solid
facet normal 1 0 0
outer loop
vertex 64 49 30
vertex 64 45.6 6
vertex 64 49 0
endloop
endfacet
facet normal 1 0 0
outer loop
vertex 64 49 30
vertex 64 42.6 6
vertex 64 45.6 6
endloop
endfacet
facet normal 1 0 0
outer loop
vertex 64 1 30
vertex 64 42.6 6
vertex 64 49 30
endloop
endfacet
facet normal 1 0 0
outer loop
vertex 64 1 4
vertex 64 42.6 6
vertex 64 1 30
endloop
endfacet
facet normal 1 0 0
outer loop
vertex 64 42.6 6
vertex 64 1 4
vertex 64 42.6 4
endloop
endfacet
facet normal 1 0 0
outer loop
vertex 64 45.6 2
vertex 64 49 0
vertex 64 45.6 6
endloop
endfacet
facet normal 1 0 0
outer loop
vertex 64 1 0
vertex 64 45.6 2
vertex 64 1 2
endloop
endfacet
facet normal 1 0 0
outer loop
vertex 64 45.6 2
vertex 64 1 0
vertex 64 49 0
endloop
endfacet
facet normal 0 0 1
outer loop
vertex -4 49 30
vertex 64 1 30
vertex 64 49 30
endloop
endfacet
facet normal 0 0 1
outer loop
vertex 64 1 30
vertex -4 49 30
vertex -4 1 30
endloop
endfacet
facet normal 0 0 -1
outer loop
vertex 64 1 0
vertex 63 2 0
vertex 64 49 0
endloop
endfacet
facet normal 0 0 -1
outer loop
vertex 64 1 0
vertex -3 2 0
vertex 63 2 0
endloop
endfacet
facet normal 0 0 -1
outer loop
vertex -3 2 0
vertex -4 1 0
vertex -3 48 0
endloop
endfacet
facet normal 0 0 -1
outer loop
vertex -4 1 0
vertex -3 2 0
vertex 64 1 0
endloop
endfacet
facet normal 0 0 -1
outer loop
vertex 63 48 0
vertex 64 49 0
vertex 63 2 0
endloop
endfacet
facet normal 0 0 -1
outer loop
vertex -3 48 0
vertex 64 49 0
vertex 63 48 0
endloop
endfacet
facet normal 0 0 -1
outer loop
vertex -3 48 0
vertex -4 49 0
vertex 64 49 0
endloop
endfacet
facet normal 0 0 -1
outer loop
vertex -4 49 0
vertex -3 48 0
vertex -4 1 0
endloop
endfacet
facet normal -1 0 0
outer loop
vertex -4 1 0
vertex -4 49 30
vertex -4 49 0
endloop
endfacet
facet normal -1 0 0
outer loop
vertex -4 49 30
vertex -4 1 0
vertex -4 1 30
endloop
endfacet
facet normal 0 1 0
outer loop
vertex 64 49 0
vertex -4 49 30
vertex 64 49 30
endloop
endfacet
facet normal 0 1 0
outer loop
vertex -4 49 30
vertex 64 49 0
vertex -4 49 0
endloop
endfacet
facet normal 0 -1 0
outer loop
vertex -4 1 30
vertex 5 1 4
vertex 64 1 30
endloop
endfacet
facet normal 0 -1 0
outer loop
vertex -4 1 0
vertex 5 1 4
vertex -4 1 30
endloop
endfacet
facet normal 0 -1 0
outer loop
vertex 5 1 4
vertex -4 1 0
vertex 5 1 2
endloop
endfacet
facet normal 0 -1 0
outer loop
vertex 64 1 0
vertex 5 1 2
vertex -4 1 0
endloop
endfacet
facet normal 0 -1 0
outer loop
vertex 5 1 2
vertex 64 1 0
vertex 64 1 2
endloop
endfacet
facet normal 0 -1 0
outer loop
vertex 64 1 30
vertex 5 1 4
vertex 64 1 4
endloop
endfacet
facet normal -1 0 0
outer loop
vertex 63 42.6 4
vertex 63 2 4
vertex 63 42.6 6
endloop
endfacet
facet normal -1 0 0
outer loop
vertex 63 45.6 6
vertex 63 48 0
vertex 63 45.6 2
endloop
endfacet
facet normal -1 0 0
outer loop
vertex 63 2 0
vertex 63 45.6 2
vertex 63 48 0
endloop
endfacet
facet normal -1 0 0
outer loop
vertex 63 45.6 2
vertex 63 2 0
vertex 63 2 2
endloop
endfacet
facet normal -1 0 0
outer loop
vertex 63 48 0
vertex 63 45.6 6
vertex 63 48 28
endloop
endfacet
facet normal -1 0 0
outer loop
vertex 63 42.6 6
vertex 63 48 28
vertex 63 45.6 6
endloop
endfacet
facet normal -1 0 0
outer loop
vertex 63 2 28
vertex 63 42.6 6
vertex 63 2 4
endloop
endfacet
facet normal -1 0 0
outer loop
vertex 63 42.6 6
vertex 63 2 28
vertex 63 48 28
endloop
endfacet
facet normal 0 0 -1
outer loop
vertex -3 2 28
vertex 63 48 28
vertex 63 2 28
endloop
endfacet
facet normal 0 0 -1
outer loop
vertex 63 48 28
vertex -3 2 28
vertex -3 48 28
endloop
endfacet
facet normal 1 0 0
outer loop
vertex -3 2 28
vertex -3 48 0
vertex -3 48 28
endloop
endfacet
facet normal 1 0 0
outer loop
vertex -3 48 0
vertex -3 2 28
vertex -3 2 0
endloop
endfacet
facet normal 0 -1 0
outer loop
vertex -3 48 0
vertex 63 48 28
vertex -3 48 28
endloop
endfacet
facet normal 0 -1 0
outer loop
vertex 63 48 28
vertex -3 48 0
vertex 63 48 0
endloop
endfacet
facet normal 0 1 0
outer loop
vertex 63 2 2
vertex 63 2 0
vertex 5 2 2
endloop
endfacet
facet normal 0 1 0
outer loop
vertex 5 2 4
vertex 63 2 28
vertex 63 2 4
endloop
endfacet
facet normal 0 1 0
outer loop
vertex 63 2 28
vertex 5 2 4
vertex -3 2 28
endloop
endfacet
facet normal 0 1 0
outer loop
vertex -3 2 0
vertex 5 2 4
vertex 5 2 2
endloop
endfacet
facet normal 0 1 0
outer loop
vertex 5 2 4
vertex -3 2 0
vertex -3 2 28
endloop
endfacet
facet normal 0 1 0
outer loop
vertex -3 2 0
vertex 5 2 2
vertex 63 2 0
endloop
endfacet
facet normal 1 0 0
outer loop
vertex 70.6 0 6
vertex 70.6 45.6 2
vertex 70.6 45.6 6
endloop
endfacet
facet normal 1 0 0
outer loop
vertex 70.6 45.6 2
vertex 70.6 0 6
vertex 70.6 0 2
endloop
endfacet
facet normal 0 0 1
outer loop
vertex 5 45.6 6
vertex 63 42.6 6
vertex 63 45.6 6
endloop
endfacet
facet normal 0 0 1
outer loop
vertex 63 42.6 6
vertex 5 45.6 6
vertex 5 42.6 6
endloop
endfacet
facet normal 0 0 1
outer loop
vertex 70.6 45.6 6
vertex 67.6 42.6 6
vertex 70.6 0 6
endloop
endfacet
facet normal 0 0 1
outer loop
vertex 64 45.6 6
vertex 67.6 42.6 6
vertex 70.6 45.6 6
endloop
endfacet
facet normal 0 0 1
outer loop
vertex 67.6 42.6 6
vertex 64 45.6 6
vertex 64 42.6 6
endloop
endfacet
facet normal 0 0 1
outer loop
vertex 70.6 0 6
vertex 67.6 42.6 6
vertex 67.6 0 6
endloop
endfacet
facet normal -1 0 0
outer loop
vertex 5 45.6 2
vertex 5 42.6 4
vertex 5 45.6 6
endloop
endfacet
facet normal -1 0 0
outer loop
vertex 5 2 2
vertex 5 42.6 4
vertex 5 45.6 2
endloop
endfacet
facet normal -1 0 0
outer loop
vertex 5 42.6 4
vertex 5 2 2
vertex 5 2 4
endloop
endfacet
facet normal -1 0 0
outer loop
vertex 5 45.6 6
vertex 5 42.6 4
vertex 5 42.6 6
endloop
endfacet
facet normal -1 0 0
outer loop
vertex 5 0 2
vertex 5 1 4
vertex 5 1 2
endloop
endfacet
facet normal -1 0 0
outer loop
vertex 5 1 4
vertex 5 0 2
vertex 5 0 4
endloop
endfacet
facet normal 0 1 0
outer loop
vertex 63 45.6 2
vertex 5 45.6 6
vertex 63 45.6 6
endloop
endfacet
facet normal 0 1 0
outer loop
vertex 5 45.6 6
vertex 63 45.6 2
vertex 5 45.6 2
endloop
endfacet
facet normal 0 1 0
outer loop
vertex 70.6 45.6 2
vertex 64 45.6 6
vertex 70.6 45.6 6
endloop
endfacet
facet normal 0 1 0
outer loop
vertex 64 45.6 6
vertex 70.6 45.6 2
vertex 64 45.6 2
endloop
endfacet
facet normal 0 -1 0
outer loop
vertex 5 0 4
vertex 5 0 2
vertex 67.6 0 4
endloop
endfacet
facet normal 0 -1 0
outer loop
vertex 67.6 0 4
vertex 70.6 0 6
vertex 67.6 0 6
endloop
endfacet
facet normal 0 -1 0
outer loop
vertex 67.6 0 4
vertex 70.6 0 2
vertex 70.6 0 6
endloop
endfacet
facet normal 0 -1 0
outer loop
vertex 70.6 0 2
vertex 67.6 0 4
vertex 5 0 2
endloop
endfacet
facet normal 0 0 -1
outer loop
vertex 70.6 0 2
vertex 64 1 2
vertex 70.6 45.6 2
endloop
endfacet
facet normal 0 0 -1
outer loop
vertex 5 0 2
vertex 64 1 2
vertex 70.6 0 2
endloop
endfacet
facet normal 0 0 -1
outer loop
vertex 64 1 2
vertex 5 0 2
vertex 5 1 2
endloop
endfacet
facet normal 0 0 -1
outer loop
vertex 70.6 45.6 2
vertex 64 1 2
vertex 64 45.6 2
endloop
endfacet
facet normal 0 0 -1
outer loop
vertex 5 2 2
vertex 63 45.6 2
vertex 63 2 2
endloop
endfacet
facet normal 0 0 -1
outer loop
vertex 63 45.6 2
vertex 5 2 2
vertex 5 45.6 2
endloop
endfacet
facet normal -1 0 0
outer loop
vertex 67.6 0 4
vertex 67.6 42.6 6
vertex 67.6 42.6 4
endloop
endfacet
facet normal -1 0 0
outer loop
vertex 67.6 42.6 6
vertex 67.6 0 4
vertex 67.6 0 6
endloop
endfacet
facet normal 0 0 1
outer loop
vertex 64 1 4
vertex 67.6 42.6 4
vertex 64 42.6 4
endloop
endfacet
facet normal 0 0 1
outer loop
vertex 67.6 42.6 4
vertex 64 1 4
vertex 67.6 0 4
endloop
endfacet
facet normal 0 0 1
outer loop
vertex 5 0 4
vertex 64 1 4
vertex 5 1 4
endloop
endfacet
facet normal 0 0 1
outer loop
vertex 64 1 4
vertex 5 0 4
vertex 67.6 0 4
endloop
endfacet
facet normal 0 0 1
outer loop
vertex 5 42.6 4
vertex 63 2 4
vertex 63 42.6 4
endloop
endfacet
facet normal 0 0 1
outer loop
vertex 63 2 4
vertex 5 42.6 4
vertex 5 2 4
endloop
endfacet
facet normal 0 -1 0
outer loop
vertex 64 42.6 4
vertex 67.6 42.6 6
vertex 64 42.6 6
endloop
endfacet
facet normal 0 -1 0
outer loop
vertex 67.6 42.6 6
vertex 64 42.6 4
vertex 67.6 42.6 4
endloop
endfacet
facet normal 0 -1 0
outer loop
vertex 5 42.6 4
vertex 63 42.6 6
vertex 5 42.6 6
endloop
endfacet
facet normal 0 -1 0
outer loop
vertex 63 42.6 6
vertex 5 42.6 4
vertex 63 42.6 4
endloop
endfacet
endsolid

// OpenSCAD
// Two-part enclosure for electronics board.
// Part 1: Box (left). Part 2: Lid (right, printed upside down).
// Both parts sit on the XY plane (Z=0) with a 10 mm gap.

// --- Dimensions ---
// Box outer dimensions (X, Y, Z)
box_w = 70;
box_h = 50;
box_d = 30;

// Wall and floor thickness
wall_t = 2;
floor_t = 2;

// Lid dimensions
lid_plate_t = 2;
lip_t = 1.5;
lip_h = 4;
// Lip outer size
lip_w = 65.6;
lip_h_dim = 45.6;

// Clearance
clearance = 0.2;

// Gap between parts
gap = 10;

// --- Derived Dimensions ---
// Box inner dimensions
box_w_in = box_w - 2 * wall_t;
box_h_in = box_h - 2 * wall_t;
box_d_in = box_d - floor_t; // Open top, so only bottom floor thickness

// Lid lip inner dimensions (to match box inner)
lip_w_in = box_w_in + 2 * clearance;
lip_h_dim_in = box_h_in + 2 * clearance;

// Lid lip outer dimensions (given)
lip_w_out = lip_w;
lip_h_dim_out = lip_h_dim;

// --- Main Module ---
module enclosure() {
    // Part 1: The Box
    // Position: Centered in Y, starts at X = -gap/2
    translate([-gap / 2, 0, 0]) {
        difference() {
            // Outer block
            translate([wall_t / 2, wall_t / 2, 0]) 
                cube([box_w - wall_t, box_h - wall_t, box_d]);
            
            // Inner void (open top)
            translate([wall_t, wall_t, 0]) 
                cube([box_w_in, box_h_in, box_d_in]);
        }
    }

    // Part 2: The Lid
    // Printed upside down, so the plate is on Z=0 and the lip points down (-Z).
    // Position: Centered in Y, starts at X = gap/2
    translate([gap / 2, 0, 0]) {
        difference() {
            // Outer block (Plate + Lip)
            // Plate is 70x50x2. Lip is 65.6x45.6x(2+4).
            // We build the whole block as one big cube, then cut.
            translate([0, 0, 0]) 
                cube([lip_w_out, lip_h_dim_out, lip_h + lid_plate_t]);
            
            // Cut out the plate hole (the space under the lip)
            // The plate is 70x50. The lip sits on top of it.
            // We need to remove the volume where the plate is, except for the lip.
            
            // 1. Remove the plate volume (70x50x2)
            translate([0, 0, 0]) 
                cube([box_w, box_h, lid_plate_t]);
            
            // 2. Remove the lip hole (the space inside the lip)
            // The lip is centered.
            // Lip outer: 65.6 x 45.6. Lip inner: 65.6 x 45.6 (calculated above).
            // Wait, the lip outer is 65.6, inner is 65.6? No.
            // Lip outer is 65.6. Lip inner must be smaller to have walls.
            // Re-reading prompt: "lip ... whose outer size is 65.6 x 45.6 mm, centred on the plate, so it slides into the box opening with 0.2 mm clearance on each side."
            // Box inner is 66 x 46.
            // Lip outer is 65.6 x 45.6.
            // Clearance = (Box Inner - Lip Outer) / 2 = (66 - 65.6)/2 = 0.2. Correct.
            // So the lip outer is 65.6 x 45.6.
            // The lip inner (hole) must be Box Inner - 2*wall_thickness_of_lip.
            // Lip wall thickness is 1.5 mm.
            // Lip inner = 65.6 - 2*1.5 = 62.6.
            // Check: Box Inner (66) - Lip Outer (65.6) = 0.4 total clearance. 0.2 each side.
            // Lip Inner (62.6) vs Lip Outer (65.6). Wall = 1.5. Correct.
            
            // Cut the lip hole
            translate([0, 0, lip_h]) // Start at top of plate
                cube([lip_w_out - 2 * lip_t, lip_h_dim_out - 2 * lip_t, lip_h]);
        }
    }
}

// Render the parts
enclosure();
